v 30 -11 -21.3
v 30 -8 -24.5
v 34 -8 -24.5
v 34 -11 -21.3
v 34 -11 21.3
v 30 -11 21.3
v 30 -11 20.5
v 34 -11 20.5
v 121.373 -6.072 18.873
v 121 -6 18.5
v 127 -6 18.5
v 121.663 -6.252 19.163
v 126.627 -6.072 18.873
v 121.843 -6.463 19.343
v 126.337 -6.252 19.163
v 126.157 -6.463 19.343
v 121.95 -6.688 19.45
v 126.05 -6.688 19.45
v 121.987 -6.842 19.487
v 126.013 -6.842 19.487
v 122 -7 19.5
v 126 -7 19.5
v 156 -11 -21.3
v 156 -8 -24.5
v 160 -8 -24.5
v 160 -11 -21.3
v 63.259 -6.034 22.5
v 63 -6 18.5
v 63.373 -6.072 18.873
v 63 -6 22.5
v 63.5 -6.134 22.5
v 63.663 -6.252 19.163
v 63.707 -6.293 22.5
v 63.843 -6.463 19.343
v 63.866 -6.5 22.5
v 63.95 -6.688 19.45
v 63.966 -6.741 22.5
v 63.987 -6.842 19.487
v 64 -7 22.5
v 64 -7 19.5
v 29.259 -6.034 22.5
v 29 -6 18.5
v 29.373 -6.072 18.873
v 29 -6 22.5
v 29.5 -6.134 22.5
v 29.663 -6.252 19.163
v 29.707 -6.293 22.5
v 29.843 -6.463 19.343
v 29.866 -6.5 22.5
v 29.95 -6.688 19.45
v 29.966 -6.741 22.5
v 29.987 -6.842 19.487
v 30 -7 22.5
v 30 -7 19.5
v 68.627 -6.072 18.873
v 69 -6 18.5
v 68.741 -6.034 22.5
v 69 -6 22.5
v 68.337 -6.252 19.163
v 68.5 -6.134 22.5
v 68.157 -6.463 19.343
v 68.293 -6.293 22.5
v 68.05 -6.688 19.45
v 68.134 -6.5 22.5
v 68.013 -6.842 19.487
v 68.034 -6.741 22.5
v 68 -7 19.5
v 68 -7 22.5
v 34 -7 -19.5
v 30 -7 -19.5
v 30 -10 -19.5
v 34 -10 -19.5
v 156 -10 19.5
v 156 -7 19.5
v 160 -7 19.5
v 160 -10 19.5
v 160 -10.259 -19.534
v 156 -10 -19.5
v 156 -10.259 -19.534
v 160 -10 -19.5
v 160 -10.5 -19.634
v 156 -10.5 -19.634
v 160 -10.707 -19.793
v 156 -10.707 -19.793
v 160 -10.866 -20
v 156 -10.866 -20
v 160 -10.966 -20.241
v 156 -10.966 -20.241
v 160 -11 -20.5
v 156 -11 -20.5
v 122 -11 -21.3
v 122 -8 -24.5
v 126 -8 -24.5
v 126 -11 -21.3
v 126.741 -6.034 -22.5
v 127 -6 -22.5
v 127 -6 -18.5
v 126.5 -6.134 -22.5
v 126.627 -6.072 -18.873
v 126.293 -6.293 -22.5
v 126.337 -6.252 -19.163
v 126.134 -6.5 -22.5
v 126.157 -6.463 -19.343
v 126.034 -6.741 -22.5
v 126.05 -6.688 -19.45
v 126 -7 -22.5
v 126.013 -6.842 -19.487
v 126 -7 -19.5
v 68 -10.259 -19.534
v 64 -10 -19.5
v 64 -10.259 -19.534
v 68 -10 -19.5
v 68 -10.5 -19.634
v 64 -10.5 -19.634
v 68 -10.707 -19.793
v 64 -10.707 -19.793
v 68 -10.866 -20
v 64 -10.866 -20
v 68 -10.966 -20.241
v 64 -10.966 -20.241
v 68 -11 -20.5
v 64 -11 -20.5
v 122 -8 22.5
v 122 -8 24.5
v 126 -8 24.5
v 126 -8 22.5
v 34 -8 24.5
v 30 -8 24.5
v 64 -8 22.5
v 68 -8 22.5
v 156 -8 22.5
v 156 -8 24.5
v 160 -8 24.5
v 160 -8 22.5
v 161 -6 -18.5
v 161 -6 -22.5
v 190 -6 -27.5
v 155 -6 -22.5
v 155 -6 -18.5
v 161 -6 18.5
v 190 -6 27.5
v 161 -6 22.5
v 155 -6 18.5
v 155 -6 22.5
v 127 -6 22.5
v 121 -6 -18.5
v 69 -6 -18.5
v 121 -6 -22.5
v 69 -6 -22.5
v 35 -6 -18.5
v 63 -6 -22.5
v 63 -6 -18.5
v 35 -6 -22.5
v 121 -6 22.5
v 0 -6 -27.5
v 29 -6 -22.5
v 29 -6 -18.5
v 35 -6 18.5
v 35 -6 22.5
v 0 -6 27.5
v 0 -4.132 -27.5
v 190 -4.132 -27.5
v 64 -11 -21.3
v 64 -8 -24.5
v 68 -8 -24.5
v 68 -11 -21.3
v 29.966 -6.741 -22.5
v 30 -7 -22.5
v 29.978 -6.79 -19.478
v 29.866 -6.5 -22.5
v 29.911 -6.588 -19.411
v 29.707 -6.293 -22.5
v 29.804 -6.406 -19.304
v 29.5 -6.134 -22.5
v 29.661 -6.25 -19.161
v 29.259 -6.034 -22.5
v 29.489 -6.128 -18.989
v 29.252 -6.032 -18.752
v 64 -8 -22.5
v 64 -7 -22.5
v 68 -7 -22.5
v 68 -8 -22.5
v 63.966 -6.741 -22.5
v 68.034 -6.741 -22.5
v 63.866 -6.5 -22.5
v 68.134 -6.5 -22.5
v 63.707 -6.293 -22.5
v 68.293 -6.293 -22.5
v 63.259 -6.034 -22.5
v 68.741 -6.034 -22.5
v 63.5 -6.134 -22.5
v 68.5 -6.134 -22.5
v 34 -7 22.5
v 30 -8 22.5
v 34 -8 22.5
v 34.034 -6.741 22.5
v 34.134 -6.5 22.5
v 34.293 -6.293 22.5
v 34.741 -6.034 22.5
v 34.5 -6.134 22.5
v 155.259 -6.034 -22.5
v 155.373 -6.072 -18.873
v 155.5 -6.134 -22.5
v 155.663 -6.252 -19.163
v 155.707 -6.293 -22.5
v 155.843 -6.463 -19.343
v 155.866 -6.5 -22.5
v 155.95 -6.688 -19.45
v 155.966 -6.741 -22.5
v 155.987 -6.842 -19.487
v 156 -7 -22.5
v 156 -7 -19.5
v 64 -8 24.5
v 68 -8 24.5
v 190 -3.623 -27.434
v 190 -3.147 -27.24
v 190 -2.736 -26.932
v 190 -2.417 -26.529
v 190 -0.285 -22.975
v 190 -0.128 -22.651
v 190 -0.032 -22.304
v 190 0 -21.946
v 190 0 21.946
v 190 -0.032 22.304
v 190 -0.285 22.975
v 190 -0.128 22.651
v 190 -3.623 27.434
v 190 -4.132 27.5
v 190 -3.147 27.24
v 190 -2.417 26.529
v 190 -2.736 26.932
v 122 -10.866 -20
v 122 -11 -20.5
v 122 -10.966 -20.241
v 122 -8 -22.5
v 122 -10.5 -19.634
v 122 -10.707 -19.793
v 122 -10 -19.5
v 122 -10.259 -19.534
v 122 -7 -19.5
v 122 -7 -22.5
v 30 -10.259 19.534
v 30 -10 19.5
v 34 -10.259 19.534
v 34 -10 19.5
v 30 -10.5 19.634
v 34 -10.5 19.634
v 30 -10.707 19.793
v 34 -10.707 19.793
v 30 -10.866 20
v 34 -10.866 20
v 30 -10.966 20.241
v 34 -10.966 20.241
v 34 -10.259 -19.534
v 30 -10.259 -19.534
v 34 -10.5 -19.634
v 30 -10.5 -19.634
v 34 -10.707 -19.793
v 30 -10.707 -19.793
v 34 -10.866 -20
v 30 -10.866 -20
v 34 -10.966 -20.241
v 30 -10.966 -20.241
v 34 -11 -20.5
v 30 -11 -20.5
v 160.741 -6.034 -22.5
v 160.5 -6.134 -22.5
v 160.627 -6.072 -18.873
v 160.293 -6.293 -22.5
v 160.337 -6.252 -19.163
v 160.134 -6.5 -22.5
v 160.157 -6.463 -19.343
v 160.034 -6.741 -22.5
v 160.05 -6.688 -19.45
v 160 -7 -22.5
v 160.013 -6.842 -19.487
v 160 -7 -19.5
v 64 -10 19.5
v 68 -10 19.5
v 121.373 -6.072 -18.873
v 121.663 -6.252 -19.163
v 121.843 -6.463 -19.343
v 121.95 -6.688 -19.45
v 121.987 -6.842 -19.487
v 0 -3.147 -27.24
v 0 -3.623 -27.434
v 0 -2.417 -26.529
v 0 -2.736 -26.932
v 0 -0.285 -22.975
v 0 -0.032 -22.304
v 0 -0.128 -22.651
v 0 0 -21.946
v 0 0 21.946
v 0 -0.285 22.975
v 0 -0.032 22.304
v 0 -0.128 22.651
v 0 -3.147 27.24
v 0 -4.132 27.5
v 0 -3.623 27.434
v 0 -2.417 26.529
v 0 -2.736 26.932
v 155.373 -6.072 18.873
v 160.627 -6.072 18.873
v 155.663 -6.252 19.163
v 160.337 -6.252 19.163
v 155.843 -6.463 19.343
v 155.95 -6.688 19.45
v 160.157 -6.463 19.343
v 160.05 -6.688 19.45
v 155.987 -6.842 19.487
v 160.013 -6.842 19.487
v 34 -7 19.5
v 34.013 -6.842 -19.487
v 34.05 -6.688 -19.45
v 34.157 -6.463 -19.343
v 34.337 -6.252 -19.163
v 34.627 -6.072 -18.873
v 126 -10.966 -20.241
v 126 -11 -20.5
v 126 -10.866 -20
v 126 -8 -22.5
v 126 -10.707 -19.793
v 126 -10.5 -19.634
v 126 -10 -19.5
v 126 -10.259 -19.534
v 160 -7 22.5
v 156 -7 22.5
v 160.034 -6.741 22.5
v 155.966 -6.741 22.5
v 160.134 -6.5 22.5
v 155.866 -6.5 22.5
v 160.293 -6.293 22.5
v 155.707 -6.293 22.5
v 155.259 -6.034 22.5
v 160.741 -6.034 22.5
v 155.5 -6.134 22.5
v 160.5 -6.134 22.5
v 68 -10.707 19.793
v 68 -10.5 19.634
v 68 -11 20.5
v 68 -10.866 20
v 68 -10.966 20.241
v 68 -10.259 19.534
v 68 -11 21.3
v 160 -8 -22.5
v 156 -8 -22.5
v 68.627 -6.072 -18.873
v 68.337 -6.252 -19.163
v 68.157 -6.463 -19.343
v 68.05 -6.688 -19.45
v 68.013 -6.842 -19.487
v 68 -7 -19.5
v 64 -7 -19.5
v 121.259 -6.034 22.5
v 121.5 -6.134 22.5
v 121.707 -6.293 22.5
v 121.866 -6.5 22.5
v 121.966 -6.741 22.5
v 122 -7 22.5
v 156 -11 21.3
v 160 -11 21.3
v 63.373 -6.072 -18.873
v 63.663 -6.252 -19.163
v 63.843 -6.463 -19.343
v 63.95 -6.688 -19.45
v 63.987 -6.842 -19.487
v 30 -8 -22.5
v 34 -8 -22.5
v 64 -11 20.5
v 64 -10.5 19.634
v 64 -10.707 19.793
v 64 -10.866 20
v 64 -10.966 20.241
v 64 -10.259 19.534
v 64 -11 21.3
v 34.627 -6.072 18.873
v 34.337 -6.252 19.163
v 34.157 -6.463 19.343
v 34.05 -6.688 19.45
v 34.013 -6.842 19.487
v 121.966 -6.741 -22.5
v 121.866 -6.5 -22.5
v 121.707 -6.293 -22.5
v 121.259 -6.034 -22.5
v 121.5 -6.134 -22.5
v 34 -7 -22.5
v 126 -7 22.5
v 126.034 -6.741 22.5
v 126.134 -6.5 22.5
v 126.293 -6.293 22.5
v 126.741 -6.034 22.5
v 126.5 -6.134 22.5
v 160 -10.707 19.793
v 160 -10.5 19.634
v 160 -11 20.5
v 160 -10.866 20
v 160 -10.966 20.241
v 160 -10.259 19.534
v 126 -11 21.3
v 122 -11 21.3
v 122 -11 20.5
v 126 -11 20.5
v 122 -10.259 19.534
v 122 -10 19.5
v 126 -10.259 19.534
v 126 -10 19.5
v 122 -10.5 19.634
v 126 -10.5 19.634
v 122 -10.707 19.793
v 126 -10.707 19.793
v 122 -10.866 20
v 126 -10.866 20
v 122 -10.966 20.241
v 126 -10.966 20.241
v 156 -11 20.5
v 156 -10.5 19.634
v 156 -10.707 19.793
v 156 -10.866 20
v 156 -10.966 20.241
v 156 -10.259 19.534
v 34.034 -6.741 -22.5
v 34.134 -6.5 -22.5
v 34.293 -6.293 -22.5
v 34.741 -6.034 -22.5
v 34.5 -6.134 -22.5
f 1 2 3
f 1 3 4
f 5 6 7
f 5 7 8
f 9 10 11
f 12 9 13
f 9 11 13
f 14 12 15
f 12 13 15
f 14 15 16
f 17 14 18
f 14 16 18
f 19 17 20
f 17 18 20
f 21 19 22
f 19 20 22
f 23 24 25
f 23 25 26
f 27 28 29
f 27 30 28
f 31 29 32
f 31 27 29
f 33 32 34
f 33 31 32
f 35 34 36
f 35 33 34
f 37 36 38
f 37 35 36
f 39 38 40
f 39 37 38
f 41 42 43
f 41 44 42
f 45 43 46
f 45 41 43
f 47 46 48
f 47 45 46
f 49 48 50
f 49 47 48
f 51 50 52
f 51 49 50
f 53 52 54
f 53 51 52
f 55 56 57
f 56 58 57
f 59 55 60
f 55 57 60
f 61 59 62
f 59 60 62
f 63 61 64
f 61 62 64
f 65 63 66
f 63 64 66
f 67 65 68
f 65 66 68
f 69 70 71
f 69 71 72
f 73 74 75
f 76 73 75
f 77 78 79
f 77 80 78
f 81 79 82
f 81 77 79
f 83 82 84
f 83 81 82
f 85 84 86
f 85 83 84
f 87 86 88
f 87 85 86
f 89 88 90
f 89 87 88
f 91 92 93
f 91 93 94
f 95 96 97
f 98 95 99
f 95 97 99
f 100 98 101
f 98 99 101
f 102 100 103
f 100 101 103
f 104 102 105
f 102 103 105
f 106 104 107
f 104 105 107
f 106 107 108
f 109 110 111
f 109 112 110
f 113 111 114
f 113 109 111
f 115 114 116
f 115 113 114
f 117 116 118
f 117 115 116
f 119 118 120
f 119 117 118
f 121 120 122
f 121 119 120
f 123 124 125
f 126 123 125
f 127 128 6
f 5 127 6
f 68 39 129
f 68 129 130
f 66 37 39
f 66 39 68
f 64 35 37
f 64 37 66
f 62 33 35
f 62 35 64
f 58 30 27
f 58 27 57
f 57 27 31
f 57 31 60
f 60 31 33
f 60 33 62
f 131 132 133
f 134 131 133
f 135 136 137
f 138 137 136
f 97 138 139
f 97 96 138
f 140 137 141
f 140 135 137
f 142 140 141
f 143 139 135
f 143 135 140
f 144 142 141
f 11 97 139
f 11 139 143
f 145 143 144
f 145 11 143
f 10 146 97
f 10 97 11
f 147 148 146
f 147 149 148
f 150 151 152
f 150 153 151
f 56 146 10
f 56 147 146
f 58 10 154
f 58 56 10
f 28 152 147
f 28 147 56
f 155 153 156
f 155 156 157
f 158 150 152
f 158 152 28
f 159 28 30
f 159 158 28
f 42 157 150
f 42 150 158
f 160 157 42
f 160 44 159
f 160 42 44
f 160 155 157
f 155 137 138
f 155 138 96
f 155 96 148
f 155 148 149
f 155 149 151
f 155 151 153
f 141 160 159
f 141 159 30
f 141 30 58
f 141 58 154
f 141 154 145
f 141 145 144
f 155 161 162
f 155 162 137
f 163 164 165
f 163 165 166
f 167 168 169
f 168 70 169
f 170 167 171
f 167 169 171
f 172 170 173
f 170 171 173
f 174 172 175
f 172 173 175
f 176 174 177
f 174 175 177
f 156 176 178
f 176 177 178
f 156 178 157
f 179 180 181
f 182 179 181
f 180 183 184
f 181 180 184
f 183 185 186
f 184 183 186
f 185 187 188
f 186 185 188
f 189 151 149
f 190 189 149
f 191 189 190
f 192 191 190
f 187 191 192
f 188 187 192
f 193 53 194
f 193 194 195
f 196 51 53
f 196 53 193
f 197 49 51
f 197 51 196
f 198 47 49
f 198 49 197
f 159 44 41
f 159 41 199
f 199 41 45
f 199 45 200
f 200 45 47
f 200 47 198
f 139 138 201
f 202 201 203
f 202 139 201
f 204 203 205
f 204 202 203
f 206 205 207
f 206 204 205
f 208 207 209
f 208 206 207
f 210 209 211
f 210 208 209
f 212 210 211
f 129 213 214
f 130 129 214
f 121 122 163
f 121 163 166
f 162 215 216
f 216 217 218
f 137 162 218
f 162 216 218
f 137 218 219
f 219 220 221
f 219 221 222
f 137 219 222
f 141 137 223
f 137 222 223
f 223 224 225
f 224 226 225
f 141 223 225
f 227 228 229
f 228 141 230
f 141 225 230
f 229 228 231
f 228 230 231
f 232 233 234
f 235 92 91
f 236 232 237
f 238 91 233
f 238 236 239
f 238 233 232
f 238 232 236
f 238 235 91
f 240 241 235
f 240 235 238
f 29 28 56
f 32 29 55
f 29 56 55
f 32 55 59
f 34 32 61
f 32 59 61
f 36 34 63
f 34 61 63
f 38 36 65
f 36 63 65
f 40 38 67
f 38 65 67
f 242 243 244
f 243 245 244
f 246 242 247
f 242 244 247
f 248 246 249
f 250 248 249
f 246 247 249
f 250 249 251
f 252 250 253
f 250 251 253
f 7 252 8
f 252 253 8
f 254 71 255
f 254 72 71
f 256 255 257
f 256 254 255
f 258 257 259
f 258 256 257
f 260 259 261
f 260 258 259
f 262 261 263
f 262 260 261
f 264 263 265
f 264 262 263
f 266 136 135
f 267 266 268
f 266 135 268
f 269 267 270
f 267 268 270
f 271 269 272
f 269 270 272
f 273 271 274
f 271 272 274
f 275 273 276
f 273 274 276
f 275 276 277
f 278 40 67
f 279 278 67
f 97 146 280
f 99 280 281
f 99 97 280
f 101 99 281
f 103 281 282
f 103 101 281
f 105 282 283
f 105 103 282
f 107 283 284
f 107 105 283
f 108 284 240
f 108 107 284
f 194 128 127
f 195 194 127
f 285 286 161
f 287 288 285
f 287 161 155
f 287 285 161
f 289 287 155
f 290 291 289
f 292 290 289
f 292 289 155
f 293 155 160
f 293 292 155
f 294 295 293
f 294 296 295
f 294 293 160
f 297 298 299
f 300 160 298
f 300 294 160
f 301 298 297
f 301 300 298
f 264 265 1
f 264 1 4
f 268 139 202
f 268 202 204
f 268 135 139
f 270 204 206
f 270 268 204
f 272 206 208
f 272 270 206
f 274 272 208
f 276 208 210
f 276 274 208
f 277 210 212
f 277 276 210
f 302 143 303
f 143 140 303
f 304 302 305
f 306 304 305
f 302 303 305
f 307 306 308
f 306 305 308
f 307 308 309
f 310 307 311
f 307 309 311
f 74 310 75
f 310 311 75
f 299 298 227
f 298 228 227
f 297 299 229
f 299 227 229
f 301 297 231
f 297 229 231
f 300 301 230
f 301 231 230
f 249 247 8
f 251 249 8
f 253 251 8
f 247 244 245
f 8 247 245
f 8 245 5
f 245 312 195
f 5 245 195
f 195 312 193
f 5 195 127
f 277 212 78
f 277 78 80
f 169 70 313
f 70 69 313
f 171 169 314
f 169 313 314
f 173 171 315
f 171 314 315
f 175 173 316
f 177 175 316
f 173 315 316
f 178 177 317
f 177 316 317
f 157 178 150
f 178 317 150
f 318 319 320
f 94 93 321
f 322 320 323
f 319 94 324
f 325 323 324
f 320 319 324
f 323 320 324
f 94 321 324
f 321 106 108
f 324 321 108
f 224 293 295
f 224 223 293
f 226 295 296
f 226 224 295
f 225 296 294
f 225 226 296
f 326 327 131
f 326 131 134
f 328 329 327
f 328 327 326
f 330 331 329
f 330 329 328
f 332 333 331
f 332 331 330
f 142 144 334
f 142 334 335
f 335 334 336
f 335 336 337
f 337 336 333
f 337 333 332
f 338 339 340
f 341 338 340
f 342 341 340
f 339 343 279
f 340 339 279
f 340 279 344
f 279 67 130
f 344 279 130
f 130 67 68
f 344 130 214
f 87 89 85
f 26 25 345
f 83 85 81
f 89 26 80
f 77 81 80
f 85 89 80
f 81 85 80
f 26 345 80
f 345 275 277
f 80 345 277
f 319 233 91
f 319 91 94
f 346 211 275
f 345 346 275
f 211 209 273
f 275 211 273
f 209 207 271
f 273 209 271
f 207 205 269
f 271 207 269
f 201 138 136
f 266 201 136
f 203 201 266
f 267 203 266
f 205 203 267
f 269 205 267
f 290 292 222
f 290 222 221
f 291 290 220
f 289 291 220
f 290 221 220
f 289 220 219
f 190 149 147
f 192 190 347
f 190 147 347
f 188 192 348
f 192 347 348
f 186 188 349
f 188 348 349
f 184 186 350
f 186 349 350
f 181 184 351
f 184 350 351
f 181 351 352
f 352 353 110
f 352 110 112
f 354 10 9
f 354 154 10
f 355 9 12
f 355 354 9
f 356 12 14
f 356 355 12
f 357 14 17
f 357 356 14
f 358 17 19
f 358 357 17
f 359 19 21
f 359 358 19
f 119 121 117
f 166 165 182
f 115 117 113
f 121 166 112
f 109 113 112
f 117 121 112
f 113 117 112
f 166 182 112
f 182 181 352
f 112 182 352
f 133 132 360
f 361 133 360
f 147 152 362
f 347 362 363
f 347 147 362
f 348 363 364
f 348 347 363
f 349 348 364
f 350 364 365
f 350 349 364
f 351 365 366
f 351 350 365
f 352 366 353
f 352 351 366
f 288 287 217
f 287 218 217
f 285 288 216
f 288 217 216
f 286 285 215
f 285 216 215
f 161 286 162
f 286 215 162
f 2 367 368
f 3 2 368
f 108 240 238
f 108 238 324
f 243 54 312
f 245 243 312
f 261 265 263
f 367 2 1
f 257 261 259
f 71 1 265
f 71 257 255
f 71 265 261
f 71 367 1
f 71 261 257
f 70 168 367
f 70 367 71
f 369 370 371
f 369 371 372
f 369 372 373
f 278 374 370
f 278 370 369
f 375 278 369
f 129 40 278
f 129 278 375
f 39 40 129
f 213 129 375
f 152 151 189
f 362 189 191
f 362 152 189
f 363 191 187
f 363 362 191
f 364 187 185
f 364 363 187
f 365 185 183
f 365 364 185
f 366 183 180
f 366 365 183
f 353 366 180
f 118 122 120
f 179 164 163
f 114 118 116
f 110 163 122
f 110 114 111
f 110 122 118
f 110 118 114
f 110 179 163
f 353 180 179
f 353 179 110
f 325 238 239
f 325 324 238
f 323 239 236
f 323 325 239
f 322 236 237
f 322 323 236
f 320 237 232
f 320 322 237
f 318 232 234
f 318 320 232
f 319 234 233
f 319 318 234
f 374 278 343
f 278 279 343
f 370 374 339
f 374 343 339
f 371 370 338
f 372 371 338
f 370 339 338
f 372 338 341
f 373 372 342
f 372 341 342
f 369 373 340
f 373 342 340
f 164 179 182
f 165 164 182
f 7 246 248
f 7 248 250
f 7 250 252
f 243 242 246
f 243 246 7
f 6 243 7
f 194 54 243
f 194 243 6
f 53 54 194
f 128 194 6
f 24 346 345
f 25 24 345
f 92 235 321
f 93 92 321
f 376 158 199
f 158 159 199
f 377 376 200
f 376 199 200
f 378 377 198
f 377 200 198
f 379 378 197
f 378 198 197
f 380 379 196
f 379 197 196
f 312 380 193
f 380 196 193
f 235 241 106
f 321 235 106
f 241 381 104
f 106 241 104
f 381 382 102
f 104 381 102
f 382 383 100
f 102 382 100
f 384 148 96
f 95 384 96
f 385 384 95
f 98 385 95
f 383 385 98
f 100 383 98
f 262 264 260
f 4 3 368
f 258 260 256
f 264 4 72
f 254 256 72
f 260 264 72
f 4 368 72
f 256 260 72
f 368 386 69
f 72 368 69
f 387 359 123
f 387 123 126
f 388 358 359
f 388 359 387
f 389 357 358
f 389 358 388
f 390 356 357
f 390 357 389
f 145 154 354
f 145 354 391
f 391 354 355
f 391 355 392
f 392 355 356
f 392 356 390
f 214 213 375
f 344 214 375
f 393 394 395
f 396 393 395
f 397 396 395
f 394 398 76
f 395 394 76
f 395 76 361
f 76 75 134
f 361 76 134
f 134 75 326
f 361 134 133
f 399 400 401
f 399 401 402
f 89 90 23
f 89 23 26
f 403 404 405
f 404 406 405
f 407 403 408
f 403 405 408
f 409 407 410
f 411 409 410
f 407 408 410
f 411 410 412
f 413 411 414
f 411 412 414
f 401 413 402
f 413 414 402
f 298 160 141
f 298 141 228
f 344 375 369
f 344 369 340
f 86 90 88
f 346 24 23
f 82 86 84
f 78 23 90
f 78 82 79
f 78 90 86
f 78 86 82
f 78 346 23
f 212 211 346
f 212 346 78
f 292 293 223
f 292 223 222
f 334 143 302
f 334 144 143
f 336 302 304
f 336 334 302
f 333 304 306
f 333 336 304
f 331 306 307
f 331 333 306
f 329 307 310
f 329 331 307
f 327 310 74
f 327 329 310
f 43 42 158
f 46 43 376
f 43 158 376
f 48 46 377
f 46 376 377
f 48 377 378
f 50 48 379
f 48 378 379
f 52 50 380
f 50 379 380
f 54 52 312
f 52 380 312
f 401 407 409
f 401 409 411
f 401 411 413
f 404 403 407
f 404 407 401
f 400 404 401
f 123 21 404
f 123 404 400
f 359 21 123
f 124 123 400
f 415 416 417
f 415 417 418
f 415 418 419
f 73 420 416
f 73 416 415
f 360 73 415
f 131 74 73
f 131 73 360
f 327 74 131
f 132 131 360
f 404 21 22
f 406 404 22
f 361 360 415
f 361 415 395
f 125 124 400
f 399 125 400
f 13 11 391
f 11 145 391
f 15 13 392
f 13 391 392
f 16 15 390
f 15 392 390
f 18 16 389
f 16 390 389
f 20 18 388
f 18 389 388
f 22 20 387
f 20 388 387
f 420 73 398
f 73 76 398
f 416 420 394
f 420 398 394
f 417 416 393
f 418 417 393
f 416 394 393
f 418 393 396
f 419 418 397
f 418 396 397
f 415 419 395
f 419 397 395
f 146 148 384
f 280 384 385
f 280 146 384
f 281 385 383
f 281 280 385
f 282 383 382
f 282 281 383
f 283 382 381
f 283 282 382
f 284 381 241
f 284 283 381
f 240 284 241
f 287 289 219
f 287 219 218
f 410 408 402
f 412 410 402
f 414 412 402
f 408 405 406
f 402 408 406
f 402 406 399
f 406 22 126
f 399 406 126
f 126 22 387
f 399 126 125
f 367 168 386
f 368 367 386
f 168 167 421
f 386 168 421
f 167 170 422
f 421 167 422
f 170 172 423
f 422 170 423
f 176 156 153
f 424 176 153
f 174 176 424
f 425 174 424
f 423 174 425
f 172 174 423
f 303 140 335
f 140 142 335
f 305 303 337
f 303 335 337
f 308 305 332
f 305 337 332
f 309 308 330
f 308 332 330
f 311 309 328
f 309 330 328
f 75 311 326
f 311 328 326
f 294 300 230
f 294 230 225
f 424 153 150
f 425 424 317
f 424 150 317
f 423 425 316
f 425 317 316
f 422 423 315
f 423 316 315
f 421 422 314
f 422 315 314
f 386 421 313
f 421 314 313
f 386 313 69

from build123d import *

# Parameters (mm, degrees)
BOSS_EXTRUDE1_DEPTH = 190
FILLET1_R           = 2
SKETCH2_W           = 4
SKETCH2_H           = 3
BOSS_EXTRUDE2_DEPTH = 2
SKETCH3_W           = 4
SKETCH3_H           = 5
BOSS_EXTRUDE3_DEPTH = 3
CUT_EXTRUDE2_DEPTH  = 193.294695715
FILLET2_R           = 1
FILLET3_R           = 1


with BuildPart() as part:
    # Sketch1 → Boss-Extrude1 (new body)
    with BuildSketch(Plane(origin=(0, 0, 0), x_dir=(0, 0, -1), z_dir=(1, 0, 0))):
        Polygon((-22.5, 0), (22.5, 0), (27.5, -3), (27.5, -6), (-27.5, -6), (-27.5, -3), align=None)
    extrude(amount=BOSS_EXTRUDE1_DEPTH)

    # Fillet1
    fillet1_edges = [part.edges().sort_by_distance(p)[0] for p in [
        (95, 0, 22.5),
        (95, 0, -22.5),
        (95, -3, -27.5),
        (95, -3, 27.5),
    ]]
    fillet(fillet1_edges, radius=FILLET1_R)

    # Sketch2 → Boss-Extrude2 (add)
    with BuildSketch(Plane.XZ.offset(6)):
        with Locations((32, -21)):
            Rectangle(SKETCH2_W, SKETCH2_H)
        with Locations((32, 21)):
            Rectangle(SKETCH2_W, SKETCH2_H)
        with Locations((66, -21)):
            Rectangle(SKETCH2_W, SKETCH2_H)
        with Locations((66, 21)):
            Rectangle(SKETCH2_W, SKETCH2_H)
        with Locations((158, -21)):
            Rectangle(SKETCH2_W, SKETCH2_H)
        with Locations((124, -21)):
            Rectangle(SKETCH2_W, SKETCH2_H)
        with Locations((124, 21)):
            Rectangle(SKETCH2_W, SKETCH2_H)
        with Locations((158, 21)):
            Rectangle(SKETCH2_W, SKETCH2_H)
    extrude(amount=BOSS_EXTRUDE2_DEPTH)

    # Sketch3 → Boss-Extrude3 (add)
    with BuildSketch(Plane.XZ.offset(8)):
        with Locations((32, -22)):
            Rectangle(SKETCH3_W, SKETCH3_H)
        with Locations((32, 22)):
            Rectangle(SKETCH3_W, SKETCH3_H)
        with Locations((66, -22)):
            Rectangle(SKETCH3_W, SKETCH3_H)
        with Locations((66, 22)):
            Rectangle(SKETCH3_W, SKETCH3_H)
        with Locations((158, -22)):
            Rectangle(SKETCH3_W, SKETCH3_H)
        with Locations((124, -22)):
            Rectangle(SKETCH3_W, SKETCH3_H)
        with Locations((124, 22)):
            Rectangle(SKETCH3_W, SKETCH3_H)
        with Locations((158, 22)):
            Rectangle(SKETCH3_W, SKETCH3_H)
    extrude(amount=BOSS_EXTRUDE3_DEPTH)

    # Sketch4 → Cut-Extrude2 (cut, through all)
    with BuildSketch(Plane.ZY):
        Polygon((-24.5, -8), (-21.3, -11), (-24.5, -11), align=None)
        Polygon((24.5, -8), (21.3, -11), (24.5, -11), align=None)
    extrude(amount=-CUT_EXTRUDE2_DEPTH, mode=Mode.SUBTRACT)

    # Fillet2
    fillet2_edges = [part.edges().sort_by_distance(p)[0] for p in [
        (32, -11, -19.5),
        (32, -11, 19.5),
        (66, -11, -19.5),
        (66, -11, 19.5),
        (158, -11, -19.5),
        (124, -11, -19.5),
        (124, -11, 19.5),
        (158, -11, 19.5),
    ]]
    fillet(fillet2_edges, radius=FILLET2_R)

    # Fillet3
    fillet3_edges = [part.edges().sort_by_distance(p)[0] for p in [
        (124, -6, -19.5),
        (122, -6, -21),
        (126, -6, -21),
        (122, -6, 21),
        (124, -6, 19.5),
        (126, -6, 21),
        (158, -6, 19.5),
        (160, -6, 21),
        (156, -6, 21),
        (30, -6, -21),
        (34, -6, -21),
        (32, -6, -19.5),
        (30, -6, 21),
        (32, -6, 19.5),
        (34, -6, 21),
        (68, -6, -21),
        (66, -6, -19.5),
        (64, -6, -21),
        (66, -6, 19.5),
        (68, -6, 21),
        (64, -6, 21),
        (160, -6, -21),
        (158, -6, -19.5),
        (156, -6, -21),
    ]]
    fillet(fillet3_edges, radius=FILLET3_R)


solid = part.part
